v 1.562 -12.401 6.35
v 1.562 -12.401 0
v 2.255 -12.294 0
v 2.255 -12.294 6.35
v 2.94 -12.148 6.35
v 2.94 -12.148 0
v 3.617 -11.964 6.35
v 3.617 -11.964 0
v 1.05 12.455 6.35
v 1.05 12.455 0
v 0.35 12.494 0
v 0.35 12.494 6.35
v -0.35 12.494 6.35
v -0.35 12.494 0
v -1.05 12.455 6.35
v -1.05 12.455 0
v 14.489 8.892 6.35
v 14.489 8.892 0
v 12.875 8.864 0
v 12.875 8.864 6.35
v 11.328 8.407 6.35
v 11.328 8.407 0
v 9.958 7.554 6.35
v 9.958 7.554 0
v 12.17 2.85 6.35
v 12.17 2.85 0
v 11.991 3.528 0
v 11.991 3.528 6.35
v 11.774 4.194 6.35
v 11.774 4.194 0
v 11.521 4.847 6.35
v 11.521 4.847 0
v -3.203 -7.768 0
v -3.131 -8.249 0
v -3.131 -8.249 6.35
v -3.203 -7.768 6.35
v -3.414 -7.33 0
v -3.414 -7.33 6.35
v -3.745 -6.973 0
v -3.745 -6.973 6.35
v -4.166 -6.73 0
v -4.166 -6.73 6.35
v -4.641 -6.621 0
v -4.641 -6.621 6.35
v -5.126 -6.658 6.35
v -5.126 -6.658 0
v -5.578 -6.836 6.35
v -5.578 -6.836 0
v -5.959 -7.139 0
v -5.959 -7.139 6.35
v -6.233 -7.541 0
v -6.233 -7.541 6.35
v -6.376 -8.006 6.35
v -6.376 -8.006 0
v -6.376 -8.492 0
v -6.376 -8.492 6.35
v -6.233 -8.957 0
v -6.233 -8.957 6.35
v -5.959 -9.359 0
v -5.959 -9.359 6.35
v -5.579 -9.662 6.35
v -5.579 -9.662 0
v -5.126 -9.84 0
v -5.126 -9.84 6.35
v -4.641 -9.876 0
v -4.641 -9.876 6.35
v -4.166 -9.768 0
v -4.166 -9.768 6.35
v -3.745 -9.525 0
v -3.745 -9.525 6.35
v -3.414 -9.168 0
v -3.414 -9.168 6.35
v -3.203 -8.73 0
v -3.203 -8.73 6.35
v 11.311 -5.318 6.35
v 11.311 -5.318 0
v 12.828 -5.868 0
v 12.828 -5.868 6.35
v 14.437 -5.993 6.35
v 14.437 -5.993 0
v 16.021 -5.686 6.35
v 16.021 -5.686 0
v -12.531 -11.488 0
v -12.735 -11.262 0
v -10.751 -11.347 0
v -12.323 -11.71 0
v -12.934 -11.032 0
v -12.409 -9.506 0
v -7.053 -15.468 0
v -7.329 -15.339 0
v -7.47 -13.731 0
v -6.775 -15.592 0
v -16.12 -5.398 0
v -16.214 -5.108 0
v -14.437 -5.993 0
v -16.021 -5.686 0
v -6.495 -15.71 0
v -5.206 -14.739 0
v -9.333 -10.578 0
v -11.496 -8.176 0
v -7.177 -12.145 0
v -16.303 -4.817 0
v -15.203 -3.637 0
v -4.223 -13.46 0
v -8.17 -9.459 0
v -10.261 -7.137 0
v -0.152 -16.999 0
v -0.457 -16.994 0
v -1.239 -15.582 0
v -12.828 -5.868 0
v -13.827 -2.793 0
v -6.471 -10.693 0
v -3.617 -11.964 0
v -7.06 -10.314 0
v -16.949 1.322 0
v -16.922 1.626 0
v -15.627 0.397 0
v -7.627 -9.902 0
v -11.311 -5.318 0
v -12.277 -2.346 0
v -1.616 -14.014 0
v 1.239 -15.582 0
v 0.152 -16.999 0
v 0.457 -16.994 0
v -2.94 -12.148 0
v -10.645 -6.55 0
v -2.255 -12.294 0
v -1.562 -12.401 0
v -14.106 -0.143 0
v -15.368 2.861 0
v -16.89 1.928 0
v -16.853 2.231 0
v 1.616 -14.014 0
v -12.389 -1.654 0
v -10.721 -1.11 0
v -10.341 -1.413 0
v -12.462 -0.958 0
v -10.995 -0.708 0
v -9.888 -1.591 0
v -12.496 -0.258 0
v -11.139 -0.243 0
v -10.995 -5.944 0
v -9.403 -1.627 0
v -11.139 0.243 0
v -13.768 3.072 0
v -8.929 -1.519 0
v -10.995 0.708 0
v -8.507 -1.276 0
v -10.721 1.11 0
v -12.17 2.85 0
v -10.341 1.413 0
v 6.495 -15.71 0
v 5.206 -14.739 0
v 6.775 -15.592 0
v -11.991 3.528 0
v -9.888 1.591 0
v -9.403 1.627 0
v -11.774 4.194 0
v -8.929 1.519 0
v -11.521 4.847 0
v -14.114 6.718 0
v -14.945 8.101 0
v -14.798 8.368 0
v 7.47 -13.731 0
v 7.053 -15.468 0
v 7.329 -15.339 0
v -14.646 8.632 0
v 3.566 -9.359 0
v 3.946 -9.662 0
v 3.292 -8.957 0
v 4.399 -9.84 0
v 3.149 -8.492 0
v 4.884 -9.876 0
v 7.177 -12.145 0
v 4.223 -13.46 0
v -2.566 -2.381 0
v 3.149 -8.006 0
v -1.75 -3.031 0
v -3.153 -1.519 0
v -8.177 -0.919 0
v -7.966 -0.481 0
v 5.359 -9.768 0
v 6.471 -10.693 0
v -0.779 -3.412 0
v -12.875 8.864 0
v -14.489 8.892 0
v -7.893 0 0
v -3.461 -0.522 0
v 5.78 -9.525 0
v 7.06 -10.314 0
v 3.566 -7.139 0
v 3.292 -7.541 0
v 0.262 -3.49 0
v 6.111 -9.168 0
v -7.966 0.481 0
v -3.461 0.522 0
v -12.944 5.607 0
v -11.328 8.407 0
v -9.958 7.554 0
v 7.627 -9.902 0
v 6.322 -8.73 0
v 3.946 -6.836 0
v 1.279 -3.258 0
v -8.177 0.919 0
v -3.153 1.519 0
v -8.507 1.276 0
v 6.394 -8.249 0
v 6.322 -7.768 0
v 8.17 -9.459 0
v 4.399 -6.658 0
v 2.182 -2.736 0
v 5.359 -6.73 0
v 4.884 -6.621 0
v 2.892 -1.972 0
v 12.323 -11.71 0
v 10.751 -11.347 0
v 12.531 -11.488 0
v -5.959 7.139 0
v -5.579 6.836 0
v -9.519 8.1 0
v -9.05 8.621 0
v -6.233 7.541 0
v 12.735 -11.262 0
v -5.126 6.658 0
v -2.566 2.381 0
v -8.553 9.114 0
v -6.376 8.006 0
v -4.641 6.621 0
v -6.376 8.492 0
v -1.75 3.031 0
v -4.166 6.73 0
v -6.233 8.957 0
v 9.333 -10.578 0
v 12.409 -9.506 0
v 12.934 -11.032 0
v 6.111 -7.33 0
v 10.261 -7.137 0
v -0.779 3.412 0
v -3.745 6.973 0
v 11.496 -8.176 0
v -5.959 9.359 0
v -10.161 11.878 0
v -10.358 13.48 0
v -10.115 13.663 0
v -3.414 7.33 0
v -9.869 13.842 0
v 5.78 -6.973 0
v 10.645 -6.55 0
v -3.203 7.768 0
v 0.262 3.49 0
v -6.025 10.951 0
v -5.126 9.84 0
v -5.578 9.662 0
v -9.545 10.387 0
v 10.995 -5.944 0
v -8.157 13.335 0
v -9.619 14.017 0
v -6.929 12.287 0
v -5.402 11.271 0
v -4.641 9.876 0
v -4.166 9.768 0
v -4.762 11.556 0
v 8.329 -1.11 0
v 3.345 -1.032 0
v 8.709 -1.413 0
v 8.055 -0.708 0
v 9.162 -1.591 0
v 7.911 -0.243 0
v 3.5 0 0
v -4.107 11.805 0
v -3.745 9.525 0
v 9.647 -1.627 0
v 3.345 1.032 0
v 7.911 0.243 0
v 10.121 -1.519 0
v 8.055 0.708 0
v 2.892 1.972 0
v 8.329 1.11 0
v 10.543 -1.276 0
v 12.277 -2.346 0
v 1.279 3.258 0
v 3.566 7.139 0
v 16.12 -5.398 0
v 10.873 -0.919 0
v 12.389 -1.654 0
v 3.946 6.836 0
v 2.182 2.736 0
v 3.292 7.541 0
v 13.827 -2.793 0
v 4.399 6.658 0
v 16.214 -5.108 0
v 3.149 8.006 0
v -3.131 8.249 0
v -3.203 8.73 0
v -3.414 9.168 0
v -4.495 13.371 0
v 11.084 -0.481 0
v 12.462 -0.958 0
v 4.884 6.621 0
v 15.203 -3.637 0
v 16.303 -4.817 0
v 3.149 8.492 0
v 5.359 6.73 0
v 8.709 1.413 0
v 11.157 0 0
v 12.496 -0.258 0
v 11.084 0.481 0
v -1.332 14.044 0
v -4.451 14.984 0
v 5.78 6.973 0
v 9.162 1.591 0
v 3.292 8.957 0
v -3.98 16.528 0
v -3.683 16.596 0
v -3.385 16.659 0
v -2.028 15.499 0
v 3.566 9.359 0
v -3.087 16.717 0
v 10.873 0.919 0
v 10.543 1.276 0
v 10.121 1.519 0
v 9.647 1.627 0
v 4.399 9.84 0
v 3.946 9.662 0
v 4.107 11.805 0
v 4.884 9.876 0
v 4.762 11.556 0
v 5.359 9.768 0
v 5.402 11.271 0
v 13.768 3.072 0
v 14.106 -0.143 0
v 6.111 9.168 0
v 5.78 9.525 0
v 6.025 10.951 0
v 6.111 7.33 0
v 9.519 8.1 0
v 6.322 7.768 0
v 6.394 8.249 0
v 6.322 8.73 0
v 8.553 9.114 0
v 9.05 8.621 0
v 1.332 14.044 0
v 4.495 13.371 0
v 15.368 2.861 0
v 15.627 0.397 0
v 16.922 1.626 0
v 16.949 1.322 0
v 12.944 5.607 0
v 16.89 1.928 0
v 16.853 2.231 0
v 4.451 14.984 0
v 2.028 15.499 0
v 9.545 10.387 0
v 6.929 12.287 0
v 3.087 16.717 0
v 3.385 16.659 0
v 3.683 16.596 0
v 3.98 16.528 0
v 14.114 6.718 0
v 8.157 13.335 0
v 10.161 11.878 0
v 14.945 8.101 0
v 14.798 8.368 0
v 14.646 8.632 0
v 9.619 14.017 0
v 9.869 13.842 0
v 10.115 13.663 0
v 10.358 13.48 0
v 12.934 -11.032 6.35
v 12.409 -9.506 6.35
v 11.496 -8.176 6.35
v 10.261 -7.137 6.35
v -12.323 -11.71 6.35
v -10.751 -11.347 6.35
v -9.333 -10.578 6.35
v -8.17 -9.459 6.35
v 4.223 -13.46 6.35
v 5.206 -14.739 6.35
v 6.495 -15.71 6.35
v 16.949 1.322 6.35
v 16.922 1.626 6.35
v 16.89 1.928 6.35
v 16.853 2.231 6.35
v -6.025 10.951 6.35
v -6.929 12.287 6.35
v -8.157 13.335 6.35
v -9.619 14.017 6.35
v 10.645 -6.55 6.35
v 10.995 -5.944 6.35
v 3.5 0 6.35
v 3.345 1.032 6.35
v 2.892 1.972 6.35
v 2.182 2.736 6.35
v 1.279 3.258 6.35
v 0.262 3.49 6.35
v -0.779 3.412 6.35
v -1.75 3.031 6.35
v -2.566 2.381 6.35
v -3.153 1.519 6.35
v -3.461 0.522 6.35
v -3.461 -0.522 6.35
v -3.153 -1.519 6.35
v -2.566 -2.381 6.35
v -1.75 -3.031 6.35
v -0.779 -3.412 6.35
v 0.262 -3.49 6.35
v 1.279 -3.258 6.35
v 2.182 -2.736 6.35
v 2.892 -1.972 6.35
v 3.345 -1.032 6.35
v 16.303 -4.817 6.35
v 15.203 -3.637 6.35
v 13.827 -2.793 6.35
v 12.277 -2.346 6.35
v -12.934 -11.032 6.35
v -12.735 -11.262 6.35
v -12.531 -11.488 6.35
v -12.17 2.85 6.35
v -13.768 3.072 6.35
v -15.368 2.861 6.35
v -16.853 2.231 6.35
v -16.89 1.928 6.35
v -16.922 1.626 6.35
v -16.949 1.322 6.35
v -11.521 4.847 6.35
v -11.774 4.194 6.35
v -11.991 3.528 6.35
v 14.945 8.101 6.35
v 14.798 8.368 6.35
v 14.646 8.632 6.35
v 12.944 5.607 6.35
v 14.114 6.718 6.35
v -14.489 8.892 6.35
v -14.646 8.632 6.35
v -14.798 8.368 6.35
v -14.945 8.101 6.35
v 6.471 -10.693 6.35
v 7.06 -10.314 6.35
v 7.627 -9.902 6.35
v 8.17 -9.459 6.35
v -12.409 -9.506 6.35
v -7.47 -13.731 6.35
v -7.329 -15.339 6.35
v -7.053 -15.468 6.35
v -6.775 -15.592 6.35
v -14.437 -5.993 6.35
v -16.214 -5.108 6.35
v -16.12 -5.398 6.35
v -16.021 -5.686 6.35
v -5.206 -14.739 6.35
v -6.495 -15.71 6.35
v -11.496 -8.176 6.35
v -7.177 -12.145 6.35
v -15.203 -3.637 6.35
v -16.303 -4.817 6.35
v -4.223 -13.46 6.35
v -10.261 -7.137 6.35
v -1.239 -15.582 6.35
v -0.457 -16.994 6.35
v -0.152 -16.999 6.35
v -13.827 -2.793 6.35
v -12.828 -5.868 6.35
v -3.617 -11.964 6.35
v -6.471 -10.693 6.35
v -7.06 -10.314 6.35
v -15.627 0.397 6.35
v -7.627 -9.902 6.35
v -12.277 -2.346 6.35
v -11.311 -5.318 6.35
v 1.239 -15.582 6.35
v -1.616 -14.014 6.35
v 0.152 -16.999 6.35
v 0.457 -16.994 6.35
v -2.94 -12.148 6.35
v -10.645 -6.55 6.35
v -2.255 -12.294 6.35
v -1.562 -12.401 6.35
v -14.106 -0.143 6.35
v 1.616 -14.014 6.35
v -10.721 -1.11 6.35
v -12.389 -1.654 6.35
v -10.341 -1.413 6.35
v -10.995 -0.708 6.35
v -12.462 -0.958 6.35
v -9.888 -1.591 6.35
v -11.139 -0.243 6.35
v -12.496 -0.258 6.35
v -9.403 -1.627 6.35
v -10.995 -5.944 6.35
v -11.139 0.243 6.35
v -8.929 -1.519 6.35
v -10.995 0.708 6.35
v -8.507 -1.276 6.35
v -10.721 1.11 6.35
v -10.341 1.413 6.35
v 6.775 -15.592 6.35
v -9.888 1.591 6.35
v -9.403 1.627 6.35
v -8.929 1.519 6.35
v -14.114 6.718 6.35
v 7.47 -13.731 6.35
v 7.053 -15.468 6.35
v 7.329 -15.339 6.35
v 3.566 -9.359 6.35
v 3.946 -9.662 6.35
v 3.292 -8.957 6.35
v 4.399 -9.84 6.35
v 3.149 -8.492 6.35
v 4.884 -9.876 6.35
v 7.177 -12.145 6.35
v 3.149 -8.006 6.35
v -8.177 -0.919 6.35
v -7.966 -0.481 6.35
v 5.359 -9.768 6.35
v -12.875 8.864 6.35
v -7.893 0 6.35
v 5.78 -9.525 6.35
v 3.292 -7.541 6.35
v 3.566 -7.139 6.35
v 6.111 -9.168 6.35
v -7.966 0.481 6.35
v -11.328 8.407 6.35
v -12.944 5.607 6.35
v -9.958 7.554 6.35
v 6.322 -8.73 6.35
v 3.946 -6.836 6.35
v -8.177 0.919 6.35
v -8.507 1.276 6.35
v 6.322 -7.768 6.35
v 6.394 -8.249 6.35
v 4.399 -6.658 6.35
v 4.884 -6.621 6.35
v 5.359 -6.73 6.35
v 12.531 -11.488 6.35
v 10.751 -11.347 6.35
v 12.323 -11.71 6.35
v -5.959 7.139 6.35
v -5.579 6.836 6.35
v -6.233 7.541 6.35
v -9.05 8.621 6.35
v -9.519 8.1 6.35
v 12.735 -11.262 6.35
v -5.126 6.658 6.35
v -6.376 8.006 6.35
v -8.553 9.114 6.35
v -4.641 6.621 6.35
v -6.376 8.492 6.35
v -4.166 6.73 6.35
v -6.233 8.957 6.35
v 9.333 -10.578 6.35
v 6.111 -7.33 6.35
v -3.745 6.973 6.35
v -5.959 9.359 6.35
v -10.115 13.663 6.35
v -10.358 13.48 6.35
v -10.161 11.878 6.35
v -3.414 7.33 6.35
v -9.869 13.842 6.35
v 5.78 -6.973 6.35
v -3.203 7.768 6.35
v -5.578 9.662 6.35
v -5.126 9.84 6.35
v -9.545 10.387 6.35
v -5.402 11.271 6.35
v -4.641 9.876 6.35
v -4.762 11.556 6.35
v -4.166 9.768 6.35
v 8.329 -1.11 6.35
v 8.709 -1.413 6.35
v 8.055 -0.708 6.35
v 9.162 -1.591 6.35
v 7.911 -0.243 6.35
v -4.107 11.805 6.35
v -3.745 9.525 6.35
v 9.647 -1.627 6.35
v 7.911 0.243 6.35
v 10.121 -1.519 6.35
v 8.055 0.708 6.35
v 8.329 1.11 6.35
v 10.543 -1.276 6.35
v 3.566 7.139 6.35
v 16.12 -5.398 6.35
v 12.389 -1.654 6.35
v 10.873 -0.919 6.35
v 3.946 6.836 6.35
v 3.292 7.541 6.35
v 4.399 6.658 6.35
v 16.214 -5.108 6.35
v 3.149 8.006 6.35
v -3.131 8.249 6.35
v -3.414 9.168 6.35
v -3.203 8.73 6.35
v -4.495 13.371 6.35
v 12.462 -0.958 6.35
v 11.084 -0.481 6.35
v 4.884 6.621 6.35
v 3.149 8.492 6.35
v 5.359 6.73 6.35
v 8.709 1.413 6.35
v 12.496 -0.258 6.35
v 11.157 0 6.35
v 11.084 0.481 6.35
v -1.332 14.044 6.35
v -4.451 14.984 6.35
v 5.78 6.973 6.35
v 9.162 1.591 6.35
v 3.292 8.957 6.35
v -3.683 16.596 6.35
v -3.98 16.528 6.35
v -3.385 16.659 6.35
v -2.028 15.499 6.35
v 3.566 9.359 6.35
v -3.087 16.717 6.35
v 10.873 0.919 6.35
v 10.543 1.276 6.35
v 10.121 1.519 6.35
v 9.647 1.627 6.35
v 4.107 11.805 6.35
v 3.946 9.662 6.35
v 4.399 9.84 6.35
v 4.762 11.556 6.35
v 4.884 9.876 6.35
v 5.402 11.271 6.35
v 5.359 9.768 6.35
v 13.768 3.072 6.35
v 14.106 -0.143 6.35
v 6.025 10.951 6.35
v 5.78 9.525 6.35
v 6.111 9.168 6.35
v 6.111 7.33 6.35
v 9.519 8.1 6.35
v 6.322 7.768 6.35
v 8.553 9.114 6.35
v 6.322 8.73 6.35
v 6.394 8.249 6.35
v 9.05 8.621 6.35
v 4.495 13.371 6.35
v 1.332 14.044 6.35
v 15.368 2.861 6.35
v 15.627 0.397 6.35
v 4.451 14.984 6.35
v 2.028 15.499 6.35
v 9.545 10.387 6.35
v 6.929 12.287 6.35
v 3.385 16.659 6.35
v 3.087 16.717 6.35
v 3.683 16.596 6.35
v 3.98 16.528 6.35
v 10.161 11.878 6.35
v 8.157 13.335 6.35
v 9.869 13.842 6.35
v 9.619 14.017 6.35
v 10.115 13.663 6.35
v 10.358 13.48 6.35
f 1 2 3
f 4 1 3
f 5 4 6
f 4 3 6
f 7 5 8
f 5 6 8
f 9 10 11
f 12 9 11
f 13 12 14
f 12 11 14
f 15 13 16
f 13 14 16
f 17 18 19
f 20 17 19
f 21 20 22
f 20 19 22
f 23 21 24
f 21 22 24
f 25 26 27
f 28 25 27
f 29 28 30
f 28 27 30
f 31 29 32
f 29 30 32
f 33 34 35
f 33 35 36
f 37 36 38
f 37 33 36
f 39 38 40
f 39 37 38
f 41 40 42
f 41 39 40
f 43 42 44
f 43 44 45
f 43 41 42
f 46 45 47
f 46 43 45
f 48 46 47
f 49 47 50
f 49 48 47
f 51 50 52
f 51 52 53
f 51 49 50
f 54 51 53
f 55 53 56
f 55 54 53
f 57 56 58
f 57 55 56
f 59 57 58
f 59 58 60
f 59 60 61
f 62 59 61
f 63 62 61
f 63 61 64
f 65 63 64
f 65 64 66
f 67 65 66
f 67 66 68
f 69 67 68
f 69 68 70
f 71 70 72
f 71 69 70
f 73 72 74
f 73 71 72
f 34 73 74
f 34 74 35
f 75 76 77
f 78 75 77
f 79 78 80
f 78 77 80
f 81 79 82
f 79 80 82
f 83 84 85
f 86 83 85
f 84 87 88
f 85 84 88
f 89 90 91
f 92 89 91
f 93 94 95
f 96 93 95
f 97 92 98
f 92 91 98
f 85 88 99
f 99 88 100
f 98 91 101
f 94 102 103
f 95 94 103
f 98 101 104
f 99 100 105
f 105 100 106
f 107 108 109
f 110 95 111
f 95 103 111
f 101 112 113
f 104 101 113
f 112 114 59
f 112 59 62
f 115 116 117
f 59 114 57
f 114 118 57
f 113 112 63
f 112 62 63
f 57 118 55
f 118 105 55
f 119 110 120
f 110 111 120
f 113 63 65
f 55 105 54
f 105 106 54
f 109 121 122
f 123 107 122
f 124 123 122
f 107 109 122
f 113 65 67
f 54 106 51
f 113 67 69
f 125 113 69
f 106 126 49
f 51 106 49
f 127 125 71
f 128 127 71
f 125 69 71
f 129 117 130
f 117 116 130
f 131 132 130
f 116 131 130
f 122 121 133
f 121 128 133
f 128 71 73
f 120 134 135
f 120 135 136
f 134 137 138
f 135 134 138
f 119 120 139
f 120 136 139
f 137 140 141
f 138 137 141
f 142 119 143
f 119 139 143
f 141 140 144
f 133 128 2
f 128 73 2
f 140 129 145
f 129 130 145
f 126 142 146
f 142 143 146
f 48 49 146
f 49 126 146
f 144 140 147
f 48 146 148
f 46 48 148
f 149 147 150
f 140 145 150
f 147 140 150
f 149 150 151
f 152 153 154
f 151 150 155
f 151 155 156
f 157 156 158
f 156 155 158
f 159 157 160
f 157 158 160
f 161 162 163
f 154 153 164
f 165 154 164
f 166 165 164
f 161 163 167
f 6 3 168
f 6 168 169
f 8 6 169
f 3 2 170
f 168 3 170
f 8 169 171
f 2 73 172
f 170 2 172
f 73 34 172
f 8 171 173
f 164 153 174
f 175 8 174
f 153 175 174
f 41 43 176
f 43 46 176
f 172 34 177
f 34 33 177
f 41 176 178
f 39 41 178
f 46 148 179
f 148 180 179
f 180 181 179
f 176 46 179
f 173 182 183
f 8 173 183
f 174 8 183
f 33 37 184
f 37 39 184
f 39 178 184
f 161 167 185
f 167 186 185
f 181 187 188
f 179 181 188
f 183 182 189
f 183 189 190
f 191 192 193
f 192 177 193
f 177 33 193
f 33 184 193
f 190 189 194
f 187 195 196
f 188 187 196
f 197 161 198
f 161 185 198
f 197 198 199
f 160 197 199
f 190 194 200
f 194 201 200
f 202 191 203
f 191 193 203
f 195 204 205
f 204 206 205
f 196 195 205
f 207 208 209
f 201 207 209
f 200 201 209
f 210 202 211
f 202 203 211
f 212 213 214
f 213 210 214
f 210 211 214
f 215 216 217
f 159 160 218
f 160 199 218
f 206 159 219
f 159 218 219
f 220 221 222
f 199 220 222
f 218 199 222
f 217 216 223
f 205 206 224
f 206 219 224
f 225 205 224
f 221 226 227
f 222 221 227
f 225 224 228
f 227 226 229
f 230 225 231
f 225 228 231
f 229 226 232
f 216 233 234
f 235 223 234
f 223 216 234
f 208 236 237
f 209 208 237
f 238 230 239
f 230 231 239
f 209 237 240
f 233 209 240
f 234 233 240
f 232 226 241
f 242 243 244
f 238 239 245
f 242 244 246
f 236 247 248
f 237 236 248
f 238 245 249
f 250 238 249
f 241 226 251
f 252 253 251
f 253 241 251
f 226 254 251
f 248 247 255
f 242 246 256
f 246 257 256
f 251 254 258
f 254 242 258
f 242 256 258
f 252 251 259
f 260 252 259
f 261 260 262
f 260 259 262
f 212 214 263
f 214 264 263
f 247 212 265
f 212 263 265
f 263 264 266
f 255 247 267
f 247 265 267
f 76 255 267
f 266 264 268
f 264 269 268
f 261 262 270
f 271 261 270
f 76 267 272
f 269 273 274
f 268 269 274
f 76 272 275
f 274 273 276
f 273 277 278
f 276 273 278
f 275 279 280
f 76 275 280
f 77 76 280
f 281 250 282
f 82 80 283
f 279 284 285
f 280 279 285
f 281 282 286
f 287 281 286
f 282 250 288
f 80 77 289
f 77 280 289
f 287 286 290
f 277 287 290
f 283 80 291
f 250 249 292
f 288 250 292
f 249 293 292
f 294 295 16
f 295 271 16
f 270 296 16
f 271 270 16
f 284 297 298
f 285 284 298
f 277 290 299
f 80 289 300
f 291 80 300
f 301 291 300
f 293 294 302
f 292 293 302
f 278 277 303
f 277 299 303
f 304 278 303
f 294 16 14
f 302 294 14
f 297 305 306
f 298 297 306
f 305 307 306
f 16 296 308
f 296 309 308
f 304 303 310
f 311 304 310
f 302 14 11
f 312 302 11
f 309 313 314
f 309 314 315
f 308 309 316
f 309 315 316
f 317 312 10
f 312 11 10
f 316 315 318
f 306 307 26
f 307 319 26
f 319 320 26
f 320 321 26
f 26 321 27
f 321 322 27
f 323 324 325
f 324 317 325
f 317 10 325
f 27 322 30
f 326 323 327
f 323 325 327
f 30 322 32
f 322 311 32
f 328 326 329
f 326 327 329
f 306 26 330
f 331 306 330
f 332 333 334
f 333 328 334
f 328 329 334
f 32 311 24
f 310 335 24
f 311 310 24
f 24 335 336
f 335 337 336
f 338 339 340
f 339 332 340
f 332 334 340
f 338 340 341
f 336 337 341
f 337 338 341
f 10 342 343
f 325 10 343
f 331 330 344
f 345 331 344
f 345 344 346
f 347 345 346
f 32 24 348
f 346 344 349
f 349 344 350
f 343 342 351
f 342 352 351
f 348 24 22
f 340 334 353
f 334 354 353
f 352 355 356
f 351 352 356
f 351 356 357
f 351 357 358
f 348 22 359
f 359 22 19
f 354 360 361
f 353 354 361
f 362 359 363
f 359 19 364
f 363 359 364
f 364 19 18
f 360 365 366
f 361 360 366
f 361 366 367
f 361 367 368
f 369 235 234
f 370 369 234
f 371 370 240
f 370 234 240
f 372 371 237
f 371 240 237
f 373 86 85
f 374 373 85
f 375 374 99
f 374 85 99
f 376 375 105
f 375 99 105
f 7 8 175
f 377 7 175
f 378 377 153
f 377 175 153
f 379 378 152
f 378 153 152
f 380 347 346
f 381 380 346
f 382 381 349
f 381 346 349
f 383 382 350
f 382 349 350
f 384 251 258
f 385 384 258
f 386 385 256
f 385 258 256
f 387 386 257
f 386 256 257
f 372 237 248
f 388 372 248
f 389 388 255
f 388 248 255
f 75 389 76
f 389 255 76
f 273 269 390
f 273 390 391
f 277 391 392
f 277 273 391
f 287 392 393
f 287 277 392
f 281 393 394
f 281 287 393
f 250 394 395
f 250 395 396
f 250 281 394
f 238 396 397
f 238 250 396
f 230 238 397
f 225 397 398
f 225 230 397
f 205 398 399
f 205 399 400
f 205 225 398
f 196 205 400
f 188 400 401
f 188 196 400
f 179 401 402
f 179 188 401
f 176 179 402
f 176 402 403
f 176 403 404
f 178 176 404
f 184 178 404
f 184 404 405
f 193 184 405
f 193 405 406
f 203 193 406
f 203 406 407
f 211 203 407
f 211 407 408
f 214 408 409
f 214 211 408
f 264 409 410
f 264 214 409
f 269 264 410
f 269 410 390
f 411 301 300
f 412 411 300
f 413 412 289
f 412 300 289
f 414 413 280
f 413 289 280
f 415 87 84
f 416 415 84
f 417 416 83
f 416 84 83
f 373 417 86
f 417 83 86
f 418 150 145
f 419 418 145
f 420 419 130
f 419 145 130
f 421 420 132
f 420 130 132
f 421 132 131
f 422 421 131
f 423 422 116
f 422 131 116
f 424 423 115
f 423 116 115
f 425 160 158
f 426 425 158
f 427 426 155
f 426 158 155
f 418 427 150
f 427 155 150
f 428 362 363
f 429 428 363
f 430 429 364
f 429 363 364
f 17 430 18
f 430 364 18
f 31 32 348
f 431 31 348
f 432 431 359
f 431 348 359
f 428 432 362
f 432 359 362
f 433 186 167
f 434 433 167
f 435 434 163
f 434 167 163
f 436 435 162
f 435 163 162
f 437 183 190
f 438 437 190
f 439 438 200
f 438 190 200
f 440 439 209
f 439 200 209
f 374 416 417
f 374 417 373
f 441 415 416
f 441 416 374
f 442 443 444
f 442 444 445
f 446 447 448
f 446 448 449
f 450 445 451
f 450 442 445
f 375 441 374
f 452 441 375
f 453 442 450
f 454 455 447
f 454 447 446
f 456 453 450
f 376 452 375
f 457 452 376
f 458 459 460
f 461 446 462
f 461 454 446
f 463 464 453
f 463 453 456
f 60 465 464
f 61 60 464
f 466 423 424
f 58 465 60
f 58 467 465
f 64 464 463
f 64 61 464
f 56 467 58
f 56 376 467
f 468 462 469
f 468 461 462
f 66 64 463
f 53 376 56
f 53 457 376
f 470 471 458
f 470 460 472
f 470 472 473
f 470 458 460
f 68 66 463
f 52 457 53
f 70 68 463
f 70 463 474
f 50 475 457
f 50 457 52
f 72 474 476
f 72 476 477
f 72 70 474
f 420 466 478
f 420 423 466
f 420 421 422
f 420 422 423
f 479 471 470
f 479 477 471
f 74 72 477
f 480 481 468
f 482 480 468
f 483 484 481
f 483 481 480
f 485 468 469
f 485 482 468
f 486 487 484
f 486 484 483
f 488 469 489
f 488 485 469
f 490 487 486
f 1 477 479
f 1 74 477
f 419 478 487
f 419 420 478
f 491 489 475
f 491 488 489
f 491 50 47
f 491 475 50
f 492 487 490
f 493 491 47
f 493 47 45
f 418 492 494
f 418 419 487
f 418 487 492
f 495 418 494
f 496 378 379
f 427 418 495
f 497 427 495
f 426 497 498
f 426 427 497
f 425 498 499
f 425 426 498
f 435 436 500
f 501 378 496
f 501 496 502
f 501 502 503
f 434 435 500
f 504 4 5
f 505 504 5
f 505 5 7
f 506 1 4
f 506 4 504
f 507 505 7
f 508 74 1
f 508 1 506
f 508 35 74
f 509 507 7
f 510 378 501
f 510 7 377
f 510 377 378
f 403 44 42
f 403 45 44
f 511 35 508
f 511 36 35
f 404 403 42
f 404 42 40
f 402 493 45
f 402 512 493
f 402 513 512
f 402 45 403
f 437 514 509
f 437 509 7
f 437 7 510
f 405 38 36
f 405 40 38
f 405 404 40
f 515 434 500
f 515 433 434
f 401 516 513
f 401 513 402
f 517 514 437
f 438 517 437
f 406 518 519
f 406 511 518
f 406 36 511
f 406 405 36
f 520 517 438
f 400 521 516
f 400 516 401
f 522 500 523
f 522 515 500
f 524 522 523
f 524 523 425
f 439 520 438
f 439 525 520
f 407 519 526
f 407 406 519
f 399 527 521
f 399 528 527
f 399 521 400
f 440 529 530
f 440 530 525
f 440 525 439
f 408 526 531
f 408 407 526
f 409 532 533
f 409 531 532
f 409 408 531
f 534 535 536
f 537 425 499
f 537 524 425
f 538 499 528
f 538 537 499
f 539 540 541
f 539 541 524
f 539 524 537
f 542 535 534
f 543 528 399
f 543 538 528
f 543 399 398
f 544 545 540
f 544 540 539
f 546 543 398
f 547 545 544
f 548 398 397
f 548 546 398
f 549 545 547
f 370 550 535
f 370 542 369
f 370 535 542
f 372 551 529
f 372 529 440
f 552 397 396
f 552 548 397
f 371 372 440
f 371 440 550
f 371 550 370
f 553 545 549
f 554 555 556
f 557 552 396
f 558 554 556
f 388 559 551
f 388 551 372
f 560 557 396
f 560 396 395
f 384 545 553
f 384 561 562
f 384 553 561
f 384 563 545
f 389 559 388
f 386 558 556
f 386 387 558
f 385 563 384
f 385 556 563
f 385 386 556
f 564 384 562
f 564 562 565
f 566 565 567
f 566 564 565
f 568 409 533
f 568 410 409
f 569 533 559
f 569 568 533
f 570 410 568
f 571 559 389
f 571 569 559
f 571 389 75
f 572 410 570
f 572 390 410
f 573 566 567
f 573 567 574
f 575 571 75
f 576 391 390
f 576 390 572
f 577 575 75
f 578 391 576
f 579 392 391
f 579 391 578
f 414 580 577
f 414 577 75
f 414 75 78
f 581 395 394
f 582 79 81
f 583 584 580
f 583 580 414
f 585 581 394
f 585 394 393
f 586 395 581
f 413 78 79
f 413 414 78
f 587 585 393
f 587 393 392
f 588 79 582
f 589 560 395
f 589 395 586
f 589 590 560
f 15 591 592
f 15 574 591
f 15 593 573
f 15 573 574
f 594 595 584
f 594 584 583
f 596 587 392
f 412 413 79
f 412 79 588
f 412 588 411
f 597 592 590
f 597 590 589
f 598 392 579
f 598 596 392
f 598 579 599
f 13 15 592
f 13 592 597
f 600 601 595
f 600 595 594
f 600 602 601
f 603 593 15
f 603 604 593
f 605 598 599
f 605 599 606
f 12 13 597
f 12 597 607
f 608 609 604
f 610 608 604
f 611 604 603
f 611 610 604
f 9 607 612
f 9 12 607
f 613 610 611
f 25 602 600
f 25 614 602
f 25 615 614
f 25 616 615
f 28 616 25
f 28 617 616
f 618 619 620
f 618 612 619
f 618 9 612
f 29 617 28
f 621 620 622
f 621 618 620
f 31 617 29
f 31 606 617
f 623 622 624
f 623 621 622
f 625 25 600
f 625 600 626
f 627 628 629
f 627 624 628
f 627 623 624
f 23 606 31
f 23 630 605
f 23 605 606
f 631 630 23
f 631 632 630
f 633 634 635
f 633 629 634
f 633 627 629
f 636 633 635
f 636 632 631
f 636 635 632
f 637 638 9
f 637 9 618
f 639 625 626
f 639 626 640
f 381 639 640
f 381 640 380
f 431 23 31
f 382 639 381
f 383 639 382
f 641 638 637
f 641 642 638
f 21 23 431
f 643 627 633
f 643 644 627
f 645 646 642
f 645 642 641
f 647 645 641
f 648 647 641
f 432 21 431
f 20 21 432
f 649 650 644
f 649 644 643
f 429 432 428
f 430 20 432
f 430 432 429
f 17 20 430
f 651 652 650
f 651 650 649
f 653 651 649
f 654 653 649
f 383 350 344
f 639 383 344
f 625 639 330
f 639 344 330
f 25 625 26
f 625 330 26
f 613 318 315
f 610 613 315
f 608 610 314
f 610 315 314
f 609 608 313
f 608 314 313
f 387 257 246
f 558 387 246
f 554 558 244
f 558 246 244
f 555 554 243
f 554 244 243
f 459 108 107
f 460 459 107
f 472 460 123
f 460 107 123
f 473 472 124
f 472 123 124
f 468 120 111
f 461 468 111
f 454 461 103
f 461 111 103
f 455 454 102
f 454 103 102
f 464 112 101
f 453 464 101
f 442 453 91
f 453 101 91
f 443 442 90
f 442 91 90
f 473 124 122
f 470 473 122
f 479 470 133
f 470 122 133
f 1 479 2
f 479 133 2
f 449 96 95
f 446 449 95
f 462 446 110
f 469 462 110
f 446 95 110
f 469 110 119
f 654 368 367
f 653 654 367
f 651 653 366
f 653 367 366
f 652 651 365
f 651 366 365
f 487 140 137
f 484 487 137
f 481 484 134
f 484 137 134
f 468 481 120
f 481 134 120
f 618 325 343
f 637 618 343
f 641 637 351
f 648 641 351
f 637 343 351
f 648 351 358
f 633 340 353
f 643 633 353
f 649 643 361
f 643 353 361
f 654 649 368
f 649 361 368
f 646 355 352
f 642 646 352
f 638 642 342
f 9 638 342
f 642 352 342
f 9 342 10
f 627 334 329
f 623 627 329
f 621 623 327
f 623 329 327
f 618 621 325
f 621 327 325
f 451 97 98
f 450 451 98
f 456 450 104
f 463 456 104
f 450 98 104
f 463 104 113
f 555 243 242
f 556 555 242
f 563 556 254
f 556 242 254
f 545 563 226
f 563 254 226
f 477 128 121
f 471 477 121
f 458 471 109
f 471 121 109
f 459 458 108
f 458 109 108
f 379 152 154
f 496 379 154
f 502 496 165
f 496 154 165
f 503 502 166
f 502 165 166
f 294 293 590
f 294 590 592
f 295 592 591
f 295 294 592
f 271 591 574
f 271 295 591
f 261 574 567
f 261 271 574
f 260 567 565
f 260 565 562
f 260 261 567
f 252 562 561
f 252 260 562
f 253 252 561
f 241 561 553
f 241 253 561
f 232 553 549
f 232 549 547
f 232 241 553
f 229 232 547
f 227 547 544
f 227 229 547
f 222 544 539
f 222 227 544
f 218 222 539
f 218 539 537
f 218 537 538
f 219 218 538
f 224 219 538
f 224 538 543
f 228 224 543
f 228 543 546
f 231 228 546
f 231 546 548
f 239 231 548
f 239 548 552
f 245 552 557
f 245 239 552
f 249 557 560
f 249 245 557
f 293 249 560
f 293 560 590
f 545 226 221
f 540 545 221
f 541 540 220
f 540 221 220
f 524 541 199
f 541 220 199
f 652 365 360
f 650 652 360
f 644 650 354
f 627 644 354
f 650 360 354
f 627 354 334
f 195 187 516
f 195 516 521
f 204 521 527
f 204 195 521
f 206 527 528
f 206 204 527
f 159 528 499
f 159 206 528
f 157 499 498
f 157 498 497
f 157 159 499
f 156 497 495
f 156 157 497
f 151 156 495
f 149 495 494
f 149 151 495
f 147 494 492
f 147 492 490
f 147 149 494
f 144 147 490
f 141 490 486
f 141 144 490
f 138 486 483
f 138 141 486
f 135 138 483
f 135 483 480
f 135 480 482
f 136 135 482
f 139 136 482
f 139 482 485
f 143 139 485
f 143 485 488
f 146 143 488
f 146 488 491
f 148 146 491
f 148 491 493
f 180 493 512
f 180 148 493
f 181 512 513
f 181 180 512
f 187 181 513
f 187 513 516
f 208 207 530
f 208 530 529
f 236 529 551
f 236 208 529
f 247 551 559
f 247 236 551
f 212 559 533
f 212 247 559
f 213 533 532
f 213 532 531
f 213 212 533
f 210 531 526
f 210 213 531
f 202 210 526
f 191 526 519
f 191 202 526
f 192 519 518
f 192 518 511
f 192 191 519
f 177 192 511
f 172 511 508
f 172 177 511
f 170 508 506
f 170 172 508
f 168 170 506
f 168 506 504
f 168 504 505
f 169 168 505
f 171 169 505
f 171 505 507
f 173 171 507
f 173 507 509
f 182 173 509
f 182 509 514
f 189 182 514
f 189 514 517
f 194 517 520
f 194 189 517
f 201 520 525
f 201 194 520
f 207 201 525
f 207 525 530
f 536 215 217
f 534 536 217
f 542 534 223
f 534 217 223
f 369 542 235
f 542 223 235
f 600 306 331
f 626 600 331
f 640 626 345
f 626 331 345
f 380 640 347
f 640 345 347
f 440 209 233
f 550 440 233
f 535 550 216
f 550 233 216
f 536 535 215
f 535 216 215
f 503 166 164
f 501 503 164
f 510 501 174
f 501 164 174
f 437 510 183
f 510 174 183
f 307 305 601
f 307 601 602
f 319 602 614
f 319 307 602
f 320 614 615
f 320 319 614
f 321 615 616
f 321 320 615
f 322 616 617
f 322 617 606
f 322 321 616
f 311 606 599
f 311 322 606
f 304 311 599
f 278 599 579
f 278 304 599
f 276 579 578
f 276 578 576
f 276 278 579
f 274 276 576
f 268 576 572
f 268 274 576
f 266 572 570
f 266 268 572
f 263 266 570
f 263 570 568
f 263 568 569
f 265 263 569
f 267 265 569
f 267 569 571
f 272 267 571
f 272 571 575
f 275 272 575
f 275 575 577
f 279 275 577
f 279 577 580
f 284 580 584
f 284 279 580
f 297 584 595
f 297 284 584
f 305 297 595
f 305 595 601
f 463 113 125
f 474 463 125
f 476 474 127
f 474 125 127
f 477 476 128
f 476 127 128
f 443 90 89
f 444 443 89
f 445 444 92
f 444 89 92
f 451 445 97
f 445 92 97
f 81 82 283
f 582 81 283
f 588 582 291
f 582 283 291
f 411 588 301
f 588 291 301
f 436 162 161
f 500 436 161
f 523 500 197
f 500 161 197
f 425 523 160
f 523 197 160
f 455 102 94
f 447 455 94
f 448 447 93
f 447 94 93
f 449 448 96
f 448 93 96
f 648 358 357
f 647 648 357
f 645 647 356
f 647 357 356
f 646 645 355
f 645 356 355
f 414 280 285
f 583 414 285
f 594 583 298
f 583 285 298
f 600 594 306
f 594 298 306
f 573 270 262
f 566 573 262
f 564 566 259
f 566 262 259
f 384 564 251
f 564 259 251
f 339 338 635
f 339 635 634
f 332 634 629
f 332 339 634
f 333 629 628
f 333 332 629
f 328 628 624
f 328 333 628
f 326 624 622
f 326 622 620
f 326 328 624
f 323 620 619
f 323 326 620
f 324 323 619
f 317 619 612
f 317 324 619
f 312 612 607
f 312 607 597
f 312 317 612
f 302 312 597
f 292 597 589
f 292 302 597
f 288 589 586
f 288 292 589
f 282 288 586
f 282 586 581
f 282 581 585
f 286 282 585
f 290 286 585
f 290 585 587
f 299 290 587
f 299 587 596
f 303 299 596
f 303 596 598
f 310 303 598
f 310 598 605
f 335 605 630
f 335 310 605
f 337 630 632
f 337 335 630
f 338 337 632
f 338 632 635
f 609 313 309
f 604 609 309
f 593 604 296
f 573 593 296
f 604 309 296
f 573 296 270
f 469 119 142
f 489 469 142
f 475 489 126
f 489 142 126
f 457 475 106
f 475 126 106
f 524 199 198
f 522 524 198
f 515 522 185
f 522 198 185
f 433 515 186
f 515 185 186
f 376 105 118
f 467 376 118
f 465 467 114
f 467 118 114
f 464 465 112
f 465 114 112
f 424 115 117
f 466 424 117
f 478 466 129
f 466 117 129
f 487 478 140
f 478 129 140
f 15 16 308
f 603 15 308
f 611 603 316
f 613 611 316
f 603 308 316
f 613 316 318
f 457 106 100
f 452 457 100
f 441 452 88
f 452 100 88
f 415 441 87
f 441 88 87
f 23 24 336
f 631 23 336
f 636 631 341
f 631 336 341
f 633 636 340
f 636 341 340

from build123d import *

# Parameters (mm, degrees)
MODEL_R             = 1.632
MODEL_R_2           = 3.5
BOSS_EXTRUDE1_DEPTH = 6.35


with BuildPart() as part:
    # Model → Boss-Extrude1 (new body)
    with BuildSketch(Plane.XY):
        with BuildLine():
            ThreePointArc((-16.948506407, 1.322168893), (-14.884445144, 0.075680968), (-12.496345641, -0.2575784))
            ThreePointArc((-12.496345641, -0.2575784), (-12.43052917, -1.306501262), (-12.276824067, -2.346186657))
            ThreePointArc((-12.276824067, -2.346186657), (-14.543449347, -3.168677314), (-16.303246508, -4.817068954))
            ThreePointArc((-16.303246508, -4.817068954), (-16.167960777, -5.253288904), (-16.021005579, -5.685717215))
            ThreePointArc((-16.021005579, -5.685717215), (-13.628399474, -5.984911247), (-11.311213223, -5.318031254))
            ThreePointArc((-11.311213223, -5.318031254), (-10.824451522, -6.2495), (-10.261156776, -7.136782372))
            ThreePointArc((-10.261156776, -7.136782372), (-11.997284916, -8.810084533), (-12.934478336, -11.031739218))
            ThreePointArc((-12.934478336, -11.031739218), (-12.633462033, -11.375220308), (-12.32332734, -11.710491163))
            ThreePointArc((-12.32332734, -11.710491163), (-10.015879724, -11.010657936), (-8.170269281, -9.458948191))
            ThreePointArc((-8.170269281, -9.458948191), (-7.346727868, -10.111903413), (-6.471242258, -10.693363579))
            ThreePointArc((-6.471242258, -10.693363579), (-7.376680931, -12.9281481), (-7.329221354, -15.338921551))
            ThreePointArc((-7.329221354, -15.338921551), (-6.914522932, -15.53027278), (-6.49483385, -15.710414802))
            ThreePointArc((-6.49483385, -15.710414802), (-4.671523379, -14.13256184), (-3.616611555, -11.964327054))
            ThreePointArc((-3.616611555, -11.964327054), (-2.598688224, -12.225866862), (-1.562391165, -12.400965077))
            ThreePointArc((-1.562391165, -12.400965077), (-1.480581798, -14.810817411), (-0.456675416, -16.993864998))
            ThreePointArc((-0.456675416, -16.993864998), (0, -17), (0.456675416, -16.993864998))
            ThreePointArc((0.456675416, -16.993864998), (1.480581798, -14.810817411), (1.562391165, -12.400965077))
            ThreePointArc((1.562391165, -12.400965077), (2.598688224, -12.225866862), (3.616611555, -11.964327054))
            ThreePointArc((3.616611555, -11.964327054), (4.671523379, -14.13256184), (6.49483385, -15.710414802))
            ThreePointArc((6.49483385, -15.710414802), (6.914522932, -15.53027278), (7.329221354, -15.338921551))
            ThreePointArc((7.329221354, -15.338921551), (7.376680931, -12.9281481), (6.471242258, -10.693363579))
            ThreePointArc((6.471242258, -10.693363579), (7.346727868, -10.111903413), (8.170269281, -9.458948191))
            ThreePointArc((8.170269281, -9.458948191), (10.015879724, -11.010657936), (12.32332734, -11.710491163))
            ThreePointArc((12.32332734, -11.710491163), (12.633462033, -11.375220308), (12.934478336, -11.031739218))
            ThreePointArc((12.934478336, -11.031739218), (11.997284916, -8.810084533), (10.261156776, -7.136782372))
            ThreePointArc((10.261156776, -7.136782372), (10.824451522, -6.2495), (11.311213223, -5.318031254))
            ThreePointArc((11.311213223, -5.318031254), (13.628399474, -5.984911247), (16.021005579, -5.685717215))
            ThreePointArc((16.021005579, -5.685717215), (16.167960777, -5.253288904), (16.303246508, -4.817068954))
            ThreePointArc((16.303246508, -4.817068954), (14.543449347, -3.168677314), (12.276824067, -2.346186657))
            ThreePointArc((12.276824067, -2.346186657), (12.43052917, -1.306501262), (12.496345641, -0.2575784))
            ThreePointArc((12.496345641, -0.2575784), (14.884445144, 0.075680968), (16.948506407, 1.322168893))
            ThreePointArc((16.948506407, 1.322168893), (16.906872221, 1.776983876), (16.853035248, 2.230516294))
            ThreePointArc((16.853035248, 2.230516294), (14.574919264, 3.020622999), (12.169716946, 2.850086045))
            ThreePointArc((12.169716946, 2.850086045), (11.887255397, 3.862403413), (11.520746371, 4.847412099))
            ThreePointArc((11.520746371, 4.847412099), (13.566835028, 6.123187257), (14.945456505, 8.101439987))
            ThreePointArc((14.945456505, 8.101439987), (14.722431864, 8.5), (14.488781088, 8.892425011))
            ThreePointArc((14.488781088, 8.892425011), (12.08625323, 8.687630155), (9.958355206, 7.553552978))
            ThreePointArc((9.958355206, 7.553552978), (9.288567174, 8.363463449), (8.553105391, 9.114241009))
            ThreePointArc((8.553105391, 9.114241009), (9.903395884, 11.111938841), (10.358201398, 13.479898509))
            ThreePointArc((10.358201398, 13.479898509), (9.992349289, 13.753288904), (9.619285053, 14.016752658))
            ThreePointArc((9.619285053, 14.016752658), (7.507764213, 12.852467132), (6.025103383, 10.950941979))
            ThreePointArc((6.025103383, 10.950941979), (5.083801302, 11.418404675), (4.106554786, 11.805134848))
            ThreePointArc((4.106554786, 11.805134848), (4.527569623, 14.179335251), (3.979919168, 16.527560117))
            ThreePointArc((3.979919168, 16.527560117), (3.534498744, 16.628509212), (3.086527243, 16.717456433))
            ThreePointArc((3.086527243, 16.717456433), (1.631114557, 14.794995781), (1.050056448, 12.454813626))
            ThreePointArc((1.050056448, 12.454813626), (0, 12.499), (-1.050056448, 12.454813626))
            ThreePointArc((-1.050056448, 12.454813626), (-1.631114557, 14.79499578), (-3.086527243, 16.717456433))
            ThreePointArc((-3.086527243, 16.717456433), (-3.534498744, 16.628509212), (-3.979919168, 16.527560117))
            ThreePointArc((-3.979919168, 16.527560117), (-4.527569623, 14.179335251), (-4.106554786, 11.805134848))
            ThreePointArc((-4.106554786, 11.805134848), (-5.083801302, 11.418404675), (-6.025103383, 10.950941979))
            ThreePointArc((-6.025103383, 10.950941979), (-7.507764213, 12.852467132), (-9.619285053, 14.016752658))
            ThreePointArc((-9.619285053, 14.016752658), (-9.992349289, 13.753288904), (-10.358201398, 13.479898509))
            ThreePointArc((-10.358201398, 13.479898509), (-9.903395884, 11.111938841), (-8.553105391, 9.114241009))
            ThreePointArc((-8.553105391, 9.114241009), (-9.288567174, 8.363463449), (-9.958355206, 7.553552978))
            ThreePointArc((-9.958355206, 7.553552978), (-12.08625323, 8.687630155), (-14.488781088, 8.892425011))
            ThreePointArc((-14.488781088, 8.892425011), (-14.722431864, 8.5), (-14.945456505, 8.101439987))
            ThreePointArc((-14.945456505, 8.101439987), (-13.566835028, 6.123187257), (-11.520746371, 4.847412099))
            ThreePointArc((-11.520746371, 4.847412099), (-11.887255397, 3.862403413), (-12.169716946, 2.850086045))
            ThreePointArc((-12.169716946, 2.850086045), (-14.574919264, 3.020622999), (-16.853035248, 2.230516294))
            ThreePointArc((-16.853035248, 2.230516294), (-16.906872221, 1.776983876), (-16.948506407, 1.322168893))
        make_face()
        with Locations((-4.7625, -8.248891971)):
            Circle(MODEL_R, mode=Mode.SUBTRACT)
        with Locations((4.7625, -8.248891971)):
            Circle(MODEL_R, mode=Mode.SUBTRACT)
        with Locations((9.525, 0)):
            Circle(MODEL_R, mode=Mode.SUBTRACT)
        with Locations((4.7625, 8.248891971)):
            Circle(MODEL_R, mode=Mode.SUBTRACT)
        with Locations((-4.7625, 8.248891971)):
            Circle(MODEL_R, mode=Mode.SUBTRACT)
        with Locations((-9.525, 0)):
            Circle(MODEL_R, mode=Mode.SUBTRACT)
        Circle(MODEL_R_2, mode=Mode.SUBTRACT)
    extrude(amount=BOSS_EXTRUDE1_DEPTH)


solid = part.part
